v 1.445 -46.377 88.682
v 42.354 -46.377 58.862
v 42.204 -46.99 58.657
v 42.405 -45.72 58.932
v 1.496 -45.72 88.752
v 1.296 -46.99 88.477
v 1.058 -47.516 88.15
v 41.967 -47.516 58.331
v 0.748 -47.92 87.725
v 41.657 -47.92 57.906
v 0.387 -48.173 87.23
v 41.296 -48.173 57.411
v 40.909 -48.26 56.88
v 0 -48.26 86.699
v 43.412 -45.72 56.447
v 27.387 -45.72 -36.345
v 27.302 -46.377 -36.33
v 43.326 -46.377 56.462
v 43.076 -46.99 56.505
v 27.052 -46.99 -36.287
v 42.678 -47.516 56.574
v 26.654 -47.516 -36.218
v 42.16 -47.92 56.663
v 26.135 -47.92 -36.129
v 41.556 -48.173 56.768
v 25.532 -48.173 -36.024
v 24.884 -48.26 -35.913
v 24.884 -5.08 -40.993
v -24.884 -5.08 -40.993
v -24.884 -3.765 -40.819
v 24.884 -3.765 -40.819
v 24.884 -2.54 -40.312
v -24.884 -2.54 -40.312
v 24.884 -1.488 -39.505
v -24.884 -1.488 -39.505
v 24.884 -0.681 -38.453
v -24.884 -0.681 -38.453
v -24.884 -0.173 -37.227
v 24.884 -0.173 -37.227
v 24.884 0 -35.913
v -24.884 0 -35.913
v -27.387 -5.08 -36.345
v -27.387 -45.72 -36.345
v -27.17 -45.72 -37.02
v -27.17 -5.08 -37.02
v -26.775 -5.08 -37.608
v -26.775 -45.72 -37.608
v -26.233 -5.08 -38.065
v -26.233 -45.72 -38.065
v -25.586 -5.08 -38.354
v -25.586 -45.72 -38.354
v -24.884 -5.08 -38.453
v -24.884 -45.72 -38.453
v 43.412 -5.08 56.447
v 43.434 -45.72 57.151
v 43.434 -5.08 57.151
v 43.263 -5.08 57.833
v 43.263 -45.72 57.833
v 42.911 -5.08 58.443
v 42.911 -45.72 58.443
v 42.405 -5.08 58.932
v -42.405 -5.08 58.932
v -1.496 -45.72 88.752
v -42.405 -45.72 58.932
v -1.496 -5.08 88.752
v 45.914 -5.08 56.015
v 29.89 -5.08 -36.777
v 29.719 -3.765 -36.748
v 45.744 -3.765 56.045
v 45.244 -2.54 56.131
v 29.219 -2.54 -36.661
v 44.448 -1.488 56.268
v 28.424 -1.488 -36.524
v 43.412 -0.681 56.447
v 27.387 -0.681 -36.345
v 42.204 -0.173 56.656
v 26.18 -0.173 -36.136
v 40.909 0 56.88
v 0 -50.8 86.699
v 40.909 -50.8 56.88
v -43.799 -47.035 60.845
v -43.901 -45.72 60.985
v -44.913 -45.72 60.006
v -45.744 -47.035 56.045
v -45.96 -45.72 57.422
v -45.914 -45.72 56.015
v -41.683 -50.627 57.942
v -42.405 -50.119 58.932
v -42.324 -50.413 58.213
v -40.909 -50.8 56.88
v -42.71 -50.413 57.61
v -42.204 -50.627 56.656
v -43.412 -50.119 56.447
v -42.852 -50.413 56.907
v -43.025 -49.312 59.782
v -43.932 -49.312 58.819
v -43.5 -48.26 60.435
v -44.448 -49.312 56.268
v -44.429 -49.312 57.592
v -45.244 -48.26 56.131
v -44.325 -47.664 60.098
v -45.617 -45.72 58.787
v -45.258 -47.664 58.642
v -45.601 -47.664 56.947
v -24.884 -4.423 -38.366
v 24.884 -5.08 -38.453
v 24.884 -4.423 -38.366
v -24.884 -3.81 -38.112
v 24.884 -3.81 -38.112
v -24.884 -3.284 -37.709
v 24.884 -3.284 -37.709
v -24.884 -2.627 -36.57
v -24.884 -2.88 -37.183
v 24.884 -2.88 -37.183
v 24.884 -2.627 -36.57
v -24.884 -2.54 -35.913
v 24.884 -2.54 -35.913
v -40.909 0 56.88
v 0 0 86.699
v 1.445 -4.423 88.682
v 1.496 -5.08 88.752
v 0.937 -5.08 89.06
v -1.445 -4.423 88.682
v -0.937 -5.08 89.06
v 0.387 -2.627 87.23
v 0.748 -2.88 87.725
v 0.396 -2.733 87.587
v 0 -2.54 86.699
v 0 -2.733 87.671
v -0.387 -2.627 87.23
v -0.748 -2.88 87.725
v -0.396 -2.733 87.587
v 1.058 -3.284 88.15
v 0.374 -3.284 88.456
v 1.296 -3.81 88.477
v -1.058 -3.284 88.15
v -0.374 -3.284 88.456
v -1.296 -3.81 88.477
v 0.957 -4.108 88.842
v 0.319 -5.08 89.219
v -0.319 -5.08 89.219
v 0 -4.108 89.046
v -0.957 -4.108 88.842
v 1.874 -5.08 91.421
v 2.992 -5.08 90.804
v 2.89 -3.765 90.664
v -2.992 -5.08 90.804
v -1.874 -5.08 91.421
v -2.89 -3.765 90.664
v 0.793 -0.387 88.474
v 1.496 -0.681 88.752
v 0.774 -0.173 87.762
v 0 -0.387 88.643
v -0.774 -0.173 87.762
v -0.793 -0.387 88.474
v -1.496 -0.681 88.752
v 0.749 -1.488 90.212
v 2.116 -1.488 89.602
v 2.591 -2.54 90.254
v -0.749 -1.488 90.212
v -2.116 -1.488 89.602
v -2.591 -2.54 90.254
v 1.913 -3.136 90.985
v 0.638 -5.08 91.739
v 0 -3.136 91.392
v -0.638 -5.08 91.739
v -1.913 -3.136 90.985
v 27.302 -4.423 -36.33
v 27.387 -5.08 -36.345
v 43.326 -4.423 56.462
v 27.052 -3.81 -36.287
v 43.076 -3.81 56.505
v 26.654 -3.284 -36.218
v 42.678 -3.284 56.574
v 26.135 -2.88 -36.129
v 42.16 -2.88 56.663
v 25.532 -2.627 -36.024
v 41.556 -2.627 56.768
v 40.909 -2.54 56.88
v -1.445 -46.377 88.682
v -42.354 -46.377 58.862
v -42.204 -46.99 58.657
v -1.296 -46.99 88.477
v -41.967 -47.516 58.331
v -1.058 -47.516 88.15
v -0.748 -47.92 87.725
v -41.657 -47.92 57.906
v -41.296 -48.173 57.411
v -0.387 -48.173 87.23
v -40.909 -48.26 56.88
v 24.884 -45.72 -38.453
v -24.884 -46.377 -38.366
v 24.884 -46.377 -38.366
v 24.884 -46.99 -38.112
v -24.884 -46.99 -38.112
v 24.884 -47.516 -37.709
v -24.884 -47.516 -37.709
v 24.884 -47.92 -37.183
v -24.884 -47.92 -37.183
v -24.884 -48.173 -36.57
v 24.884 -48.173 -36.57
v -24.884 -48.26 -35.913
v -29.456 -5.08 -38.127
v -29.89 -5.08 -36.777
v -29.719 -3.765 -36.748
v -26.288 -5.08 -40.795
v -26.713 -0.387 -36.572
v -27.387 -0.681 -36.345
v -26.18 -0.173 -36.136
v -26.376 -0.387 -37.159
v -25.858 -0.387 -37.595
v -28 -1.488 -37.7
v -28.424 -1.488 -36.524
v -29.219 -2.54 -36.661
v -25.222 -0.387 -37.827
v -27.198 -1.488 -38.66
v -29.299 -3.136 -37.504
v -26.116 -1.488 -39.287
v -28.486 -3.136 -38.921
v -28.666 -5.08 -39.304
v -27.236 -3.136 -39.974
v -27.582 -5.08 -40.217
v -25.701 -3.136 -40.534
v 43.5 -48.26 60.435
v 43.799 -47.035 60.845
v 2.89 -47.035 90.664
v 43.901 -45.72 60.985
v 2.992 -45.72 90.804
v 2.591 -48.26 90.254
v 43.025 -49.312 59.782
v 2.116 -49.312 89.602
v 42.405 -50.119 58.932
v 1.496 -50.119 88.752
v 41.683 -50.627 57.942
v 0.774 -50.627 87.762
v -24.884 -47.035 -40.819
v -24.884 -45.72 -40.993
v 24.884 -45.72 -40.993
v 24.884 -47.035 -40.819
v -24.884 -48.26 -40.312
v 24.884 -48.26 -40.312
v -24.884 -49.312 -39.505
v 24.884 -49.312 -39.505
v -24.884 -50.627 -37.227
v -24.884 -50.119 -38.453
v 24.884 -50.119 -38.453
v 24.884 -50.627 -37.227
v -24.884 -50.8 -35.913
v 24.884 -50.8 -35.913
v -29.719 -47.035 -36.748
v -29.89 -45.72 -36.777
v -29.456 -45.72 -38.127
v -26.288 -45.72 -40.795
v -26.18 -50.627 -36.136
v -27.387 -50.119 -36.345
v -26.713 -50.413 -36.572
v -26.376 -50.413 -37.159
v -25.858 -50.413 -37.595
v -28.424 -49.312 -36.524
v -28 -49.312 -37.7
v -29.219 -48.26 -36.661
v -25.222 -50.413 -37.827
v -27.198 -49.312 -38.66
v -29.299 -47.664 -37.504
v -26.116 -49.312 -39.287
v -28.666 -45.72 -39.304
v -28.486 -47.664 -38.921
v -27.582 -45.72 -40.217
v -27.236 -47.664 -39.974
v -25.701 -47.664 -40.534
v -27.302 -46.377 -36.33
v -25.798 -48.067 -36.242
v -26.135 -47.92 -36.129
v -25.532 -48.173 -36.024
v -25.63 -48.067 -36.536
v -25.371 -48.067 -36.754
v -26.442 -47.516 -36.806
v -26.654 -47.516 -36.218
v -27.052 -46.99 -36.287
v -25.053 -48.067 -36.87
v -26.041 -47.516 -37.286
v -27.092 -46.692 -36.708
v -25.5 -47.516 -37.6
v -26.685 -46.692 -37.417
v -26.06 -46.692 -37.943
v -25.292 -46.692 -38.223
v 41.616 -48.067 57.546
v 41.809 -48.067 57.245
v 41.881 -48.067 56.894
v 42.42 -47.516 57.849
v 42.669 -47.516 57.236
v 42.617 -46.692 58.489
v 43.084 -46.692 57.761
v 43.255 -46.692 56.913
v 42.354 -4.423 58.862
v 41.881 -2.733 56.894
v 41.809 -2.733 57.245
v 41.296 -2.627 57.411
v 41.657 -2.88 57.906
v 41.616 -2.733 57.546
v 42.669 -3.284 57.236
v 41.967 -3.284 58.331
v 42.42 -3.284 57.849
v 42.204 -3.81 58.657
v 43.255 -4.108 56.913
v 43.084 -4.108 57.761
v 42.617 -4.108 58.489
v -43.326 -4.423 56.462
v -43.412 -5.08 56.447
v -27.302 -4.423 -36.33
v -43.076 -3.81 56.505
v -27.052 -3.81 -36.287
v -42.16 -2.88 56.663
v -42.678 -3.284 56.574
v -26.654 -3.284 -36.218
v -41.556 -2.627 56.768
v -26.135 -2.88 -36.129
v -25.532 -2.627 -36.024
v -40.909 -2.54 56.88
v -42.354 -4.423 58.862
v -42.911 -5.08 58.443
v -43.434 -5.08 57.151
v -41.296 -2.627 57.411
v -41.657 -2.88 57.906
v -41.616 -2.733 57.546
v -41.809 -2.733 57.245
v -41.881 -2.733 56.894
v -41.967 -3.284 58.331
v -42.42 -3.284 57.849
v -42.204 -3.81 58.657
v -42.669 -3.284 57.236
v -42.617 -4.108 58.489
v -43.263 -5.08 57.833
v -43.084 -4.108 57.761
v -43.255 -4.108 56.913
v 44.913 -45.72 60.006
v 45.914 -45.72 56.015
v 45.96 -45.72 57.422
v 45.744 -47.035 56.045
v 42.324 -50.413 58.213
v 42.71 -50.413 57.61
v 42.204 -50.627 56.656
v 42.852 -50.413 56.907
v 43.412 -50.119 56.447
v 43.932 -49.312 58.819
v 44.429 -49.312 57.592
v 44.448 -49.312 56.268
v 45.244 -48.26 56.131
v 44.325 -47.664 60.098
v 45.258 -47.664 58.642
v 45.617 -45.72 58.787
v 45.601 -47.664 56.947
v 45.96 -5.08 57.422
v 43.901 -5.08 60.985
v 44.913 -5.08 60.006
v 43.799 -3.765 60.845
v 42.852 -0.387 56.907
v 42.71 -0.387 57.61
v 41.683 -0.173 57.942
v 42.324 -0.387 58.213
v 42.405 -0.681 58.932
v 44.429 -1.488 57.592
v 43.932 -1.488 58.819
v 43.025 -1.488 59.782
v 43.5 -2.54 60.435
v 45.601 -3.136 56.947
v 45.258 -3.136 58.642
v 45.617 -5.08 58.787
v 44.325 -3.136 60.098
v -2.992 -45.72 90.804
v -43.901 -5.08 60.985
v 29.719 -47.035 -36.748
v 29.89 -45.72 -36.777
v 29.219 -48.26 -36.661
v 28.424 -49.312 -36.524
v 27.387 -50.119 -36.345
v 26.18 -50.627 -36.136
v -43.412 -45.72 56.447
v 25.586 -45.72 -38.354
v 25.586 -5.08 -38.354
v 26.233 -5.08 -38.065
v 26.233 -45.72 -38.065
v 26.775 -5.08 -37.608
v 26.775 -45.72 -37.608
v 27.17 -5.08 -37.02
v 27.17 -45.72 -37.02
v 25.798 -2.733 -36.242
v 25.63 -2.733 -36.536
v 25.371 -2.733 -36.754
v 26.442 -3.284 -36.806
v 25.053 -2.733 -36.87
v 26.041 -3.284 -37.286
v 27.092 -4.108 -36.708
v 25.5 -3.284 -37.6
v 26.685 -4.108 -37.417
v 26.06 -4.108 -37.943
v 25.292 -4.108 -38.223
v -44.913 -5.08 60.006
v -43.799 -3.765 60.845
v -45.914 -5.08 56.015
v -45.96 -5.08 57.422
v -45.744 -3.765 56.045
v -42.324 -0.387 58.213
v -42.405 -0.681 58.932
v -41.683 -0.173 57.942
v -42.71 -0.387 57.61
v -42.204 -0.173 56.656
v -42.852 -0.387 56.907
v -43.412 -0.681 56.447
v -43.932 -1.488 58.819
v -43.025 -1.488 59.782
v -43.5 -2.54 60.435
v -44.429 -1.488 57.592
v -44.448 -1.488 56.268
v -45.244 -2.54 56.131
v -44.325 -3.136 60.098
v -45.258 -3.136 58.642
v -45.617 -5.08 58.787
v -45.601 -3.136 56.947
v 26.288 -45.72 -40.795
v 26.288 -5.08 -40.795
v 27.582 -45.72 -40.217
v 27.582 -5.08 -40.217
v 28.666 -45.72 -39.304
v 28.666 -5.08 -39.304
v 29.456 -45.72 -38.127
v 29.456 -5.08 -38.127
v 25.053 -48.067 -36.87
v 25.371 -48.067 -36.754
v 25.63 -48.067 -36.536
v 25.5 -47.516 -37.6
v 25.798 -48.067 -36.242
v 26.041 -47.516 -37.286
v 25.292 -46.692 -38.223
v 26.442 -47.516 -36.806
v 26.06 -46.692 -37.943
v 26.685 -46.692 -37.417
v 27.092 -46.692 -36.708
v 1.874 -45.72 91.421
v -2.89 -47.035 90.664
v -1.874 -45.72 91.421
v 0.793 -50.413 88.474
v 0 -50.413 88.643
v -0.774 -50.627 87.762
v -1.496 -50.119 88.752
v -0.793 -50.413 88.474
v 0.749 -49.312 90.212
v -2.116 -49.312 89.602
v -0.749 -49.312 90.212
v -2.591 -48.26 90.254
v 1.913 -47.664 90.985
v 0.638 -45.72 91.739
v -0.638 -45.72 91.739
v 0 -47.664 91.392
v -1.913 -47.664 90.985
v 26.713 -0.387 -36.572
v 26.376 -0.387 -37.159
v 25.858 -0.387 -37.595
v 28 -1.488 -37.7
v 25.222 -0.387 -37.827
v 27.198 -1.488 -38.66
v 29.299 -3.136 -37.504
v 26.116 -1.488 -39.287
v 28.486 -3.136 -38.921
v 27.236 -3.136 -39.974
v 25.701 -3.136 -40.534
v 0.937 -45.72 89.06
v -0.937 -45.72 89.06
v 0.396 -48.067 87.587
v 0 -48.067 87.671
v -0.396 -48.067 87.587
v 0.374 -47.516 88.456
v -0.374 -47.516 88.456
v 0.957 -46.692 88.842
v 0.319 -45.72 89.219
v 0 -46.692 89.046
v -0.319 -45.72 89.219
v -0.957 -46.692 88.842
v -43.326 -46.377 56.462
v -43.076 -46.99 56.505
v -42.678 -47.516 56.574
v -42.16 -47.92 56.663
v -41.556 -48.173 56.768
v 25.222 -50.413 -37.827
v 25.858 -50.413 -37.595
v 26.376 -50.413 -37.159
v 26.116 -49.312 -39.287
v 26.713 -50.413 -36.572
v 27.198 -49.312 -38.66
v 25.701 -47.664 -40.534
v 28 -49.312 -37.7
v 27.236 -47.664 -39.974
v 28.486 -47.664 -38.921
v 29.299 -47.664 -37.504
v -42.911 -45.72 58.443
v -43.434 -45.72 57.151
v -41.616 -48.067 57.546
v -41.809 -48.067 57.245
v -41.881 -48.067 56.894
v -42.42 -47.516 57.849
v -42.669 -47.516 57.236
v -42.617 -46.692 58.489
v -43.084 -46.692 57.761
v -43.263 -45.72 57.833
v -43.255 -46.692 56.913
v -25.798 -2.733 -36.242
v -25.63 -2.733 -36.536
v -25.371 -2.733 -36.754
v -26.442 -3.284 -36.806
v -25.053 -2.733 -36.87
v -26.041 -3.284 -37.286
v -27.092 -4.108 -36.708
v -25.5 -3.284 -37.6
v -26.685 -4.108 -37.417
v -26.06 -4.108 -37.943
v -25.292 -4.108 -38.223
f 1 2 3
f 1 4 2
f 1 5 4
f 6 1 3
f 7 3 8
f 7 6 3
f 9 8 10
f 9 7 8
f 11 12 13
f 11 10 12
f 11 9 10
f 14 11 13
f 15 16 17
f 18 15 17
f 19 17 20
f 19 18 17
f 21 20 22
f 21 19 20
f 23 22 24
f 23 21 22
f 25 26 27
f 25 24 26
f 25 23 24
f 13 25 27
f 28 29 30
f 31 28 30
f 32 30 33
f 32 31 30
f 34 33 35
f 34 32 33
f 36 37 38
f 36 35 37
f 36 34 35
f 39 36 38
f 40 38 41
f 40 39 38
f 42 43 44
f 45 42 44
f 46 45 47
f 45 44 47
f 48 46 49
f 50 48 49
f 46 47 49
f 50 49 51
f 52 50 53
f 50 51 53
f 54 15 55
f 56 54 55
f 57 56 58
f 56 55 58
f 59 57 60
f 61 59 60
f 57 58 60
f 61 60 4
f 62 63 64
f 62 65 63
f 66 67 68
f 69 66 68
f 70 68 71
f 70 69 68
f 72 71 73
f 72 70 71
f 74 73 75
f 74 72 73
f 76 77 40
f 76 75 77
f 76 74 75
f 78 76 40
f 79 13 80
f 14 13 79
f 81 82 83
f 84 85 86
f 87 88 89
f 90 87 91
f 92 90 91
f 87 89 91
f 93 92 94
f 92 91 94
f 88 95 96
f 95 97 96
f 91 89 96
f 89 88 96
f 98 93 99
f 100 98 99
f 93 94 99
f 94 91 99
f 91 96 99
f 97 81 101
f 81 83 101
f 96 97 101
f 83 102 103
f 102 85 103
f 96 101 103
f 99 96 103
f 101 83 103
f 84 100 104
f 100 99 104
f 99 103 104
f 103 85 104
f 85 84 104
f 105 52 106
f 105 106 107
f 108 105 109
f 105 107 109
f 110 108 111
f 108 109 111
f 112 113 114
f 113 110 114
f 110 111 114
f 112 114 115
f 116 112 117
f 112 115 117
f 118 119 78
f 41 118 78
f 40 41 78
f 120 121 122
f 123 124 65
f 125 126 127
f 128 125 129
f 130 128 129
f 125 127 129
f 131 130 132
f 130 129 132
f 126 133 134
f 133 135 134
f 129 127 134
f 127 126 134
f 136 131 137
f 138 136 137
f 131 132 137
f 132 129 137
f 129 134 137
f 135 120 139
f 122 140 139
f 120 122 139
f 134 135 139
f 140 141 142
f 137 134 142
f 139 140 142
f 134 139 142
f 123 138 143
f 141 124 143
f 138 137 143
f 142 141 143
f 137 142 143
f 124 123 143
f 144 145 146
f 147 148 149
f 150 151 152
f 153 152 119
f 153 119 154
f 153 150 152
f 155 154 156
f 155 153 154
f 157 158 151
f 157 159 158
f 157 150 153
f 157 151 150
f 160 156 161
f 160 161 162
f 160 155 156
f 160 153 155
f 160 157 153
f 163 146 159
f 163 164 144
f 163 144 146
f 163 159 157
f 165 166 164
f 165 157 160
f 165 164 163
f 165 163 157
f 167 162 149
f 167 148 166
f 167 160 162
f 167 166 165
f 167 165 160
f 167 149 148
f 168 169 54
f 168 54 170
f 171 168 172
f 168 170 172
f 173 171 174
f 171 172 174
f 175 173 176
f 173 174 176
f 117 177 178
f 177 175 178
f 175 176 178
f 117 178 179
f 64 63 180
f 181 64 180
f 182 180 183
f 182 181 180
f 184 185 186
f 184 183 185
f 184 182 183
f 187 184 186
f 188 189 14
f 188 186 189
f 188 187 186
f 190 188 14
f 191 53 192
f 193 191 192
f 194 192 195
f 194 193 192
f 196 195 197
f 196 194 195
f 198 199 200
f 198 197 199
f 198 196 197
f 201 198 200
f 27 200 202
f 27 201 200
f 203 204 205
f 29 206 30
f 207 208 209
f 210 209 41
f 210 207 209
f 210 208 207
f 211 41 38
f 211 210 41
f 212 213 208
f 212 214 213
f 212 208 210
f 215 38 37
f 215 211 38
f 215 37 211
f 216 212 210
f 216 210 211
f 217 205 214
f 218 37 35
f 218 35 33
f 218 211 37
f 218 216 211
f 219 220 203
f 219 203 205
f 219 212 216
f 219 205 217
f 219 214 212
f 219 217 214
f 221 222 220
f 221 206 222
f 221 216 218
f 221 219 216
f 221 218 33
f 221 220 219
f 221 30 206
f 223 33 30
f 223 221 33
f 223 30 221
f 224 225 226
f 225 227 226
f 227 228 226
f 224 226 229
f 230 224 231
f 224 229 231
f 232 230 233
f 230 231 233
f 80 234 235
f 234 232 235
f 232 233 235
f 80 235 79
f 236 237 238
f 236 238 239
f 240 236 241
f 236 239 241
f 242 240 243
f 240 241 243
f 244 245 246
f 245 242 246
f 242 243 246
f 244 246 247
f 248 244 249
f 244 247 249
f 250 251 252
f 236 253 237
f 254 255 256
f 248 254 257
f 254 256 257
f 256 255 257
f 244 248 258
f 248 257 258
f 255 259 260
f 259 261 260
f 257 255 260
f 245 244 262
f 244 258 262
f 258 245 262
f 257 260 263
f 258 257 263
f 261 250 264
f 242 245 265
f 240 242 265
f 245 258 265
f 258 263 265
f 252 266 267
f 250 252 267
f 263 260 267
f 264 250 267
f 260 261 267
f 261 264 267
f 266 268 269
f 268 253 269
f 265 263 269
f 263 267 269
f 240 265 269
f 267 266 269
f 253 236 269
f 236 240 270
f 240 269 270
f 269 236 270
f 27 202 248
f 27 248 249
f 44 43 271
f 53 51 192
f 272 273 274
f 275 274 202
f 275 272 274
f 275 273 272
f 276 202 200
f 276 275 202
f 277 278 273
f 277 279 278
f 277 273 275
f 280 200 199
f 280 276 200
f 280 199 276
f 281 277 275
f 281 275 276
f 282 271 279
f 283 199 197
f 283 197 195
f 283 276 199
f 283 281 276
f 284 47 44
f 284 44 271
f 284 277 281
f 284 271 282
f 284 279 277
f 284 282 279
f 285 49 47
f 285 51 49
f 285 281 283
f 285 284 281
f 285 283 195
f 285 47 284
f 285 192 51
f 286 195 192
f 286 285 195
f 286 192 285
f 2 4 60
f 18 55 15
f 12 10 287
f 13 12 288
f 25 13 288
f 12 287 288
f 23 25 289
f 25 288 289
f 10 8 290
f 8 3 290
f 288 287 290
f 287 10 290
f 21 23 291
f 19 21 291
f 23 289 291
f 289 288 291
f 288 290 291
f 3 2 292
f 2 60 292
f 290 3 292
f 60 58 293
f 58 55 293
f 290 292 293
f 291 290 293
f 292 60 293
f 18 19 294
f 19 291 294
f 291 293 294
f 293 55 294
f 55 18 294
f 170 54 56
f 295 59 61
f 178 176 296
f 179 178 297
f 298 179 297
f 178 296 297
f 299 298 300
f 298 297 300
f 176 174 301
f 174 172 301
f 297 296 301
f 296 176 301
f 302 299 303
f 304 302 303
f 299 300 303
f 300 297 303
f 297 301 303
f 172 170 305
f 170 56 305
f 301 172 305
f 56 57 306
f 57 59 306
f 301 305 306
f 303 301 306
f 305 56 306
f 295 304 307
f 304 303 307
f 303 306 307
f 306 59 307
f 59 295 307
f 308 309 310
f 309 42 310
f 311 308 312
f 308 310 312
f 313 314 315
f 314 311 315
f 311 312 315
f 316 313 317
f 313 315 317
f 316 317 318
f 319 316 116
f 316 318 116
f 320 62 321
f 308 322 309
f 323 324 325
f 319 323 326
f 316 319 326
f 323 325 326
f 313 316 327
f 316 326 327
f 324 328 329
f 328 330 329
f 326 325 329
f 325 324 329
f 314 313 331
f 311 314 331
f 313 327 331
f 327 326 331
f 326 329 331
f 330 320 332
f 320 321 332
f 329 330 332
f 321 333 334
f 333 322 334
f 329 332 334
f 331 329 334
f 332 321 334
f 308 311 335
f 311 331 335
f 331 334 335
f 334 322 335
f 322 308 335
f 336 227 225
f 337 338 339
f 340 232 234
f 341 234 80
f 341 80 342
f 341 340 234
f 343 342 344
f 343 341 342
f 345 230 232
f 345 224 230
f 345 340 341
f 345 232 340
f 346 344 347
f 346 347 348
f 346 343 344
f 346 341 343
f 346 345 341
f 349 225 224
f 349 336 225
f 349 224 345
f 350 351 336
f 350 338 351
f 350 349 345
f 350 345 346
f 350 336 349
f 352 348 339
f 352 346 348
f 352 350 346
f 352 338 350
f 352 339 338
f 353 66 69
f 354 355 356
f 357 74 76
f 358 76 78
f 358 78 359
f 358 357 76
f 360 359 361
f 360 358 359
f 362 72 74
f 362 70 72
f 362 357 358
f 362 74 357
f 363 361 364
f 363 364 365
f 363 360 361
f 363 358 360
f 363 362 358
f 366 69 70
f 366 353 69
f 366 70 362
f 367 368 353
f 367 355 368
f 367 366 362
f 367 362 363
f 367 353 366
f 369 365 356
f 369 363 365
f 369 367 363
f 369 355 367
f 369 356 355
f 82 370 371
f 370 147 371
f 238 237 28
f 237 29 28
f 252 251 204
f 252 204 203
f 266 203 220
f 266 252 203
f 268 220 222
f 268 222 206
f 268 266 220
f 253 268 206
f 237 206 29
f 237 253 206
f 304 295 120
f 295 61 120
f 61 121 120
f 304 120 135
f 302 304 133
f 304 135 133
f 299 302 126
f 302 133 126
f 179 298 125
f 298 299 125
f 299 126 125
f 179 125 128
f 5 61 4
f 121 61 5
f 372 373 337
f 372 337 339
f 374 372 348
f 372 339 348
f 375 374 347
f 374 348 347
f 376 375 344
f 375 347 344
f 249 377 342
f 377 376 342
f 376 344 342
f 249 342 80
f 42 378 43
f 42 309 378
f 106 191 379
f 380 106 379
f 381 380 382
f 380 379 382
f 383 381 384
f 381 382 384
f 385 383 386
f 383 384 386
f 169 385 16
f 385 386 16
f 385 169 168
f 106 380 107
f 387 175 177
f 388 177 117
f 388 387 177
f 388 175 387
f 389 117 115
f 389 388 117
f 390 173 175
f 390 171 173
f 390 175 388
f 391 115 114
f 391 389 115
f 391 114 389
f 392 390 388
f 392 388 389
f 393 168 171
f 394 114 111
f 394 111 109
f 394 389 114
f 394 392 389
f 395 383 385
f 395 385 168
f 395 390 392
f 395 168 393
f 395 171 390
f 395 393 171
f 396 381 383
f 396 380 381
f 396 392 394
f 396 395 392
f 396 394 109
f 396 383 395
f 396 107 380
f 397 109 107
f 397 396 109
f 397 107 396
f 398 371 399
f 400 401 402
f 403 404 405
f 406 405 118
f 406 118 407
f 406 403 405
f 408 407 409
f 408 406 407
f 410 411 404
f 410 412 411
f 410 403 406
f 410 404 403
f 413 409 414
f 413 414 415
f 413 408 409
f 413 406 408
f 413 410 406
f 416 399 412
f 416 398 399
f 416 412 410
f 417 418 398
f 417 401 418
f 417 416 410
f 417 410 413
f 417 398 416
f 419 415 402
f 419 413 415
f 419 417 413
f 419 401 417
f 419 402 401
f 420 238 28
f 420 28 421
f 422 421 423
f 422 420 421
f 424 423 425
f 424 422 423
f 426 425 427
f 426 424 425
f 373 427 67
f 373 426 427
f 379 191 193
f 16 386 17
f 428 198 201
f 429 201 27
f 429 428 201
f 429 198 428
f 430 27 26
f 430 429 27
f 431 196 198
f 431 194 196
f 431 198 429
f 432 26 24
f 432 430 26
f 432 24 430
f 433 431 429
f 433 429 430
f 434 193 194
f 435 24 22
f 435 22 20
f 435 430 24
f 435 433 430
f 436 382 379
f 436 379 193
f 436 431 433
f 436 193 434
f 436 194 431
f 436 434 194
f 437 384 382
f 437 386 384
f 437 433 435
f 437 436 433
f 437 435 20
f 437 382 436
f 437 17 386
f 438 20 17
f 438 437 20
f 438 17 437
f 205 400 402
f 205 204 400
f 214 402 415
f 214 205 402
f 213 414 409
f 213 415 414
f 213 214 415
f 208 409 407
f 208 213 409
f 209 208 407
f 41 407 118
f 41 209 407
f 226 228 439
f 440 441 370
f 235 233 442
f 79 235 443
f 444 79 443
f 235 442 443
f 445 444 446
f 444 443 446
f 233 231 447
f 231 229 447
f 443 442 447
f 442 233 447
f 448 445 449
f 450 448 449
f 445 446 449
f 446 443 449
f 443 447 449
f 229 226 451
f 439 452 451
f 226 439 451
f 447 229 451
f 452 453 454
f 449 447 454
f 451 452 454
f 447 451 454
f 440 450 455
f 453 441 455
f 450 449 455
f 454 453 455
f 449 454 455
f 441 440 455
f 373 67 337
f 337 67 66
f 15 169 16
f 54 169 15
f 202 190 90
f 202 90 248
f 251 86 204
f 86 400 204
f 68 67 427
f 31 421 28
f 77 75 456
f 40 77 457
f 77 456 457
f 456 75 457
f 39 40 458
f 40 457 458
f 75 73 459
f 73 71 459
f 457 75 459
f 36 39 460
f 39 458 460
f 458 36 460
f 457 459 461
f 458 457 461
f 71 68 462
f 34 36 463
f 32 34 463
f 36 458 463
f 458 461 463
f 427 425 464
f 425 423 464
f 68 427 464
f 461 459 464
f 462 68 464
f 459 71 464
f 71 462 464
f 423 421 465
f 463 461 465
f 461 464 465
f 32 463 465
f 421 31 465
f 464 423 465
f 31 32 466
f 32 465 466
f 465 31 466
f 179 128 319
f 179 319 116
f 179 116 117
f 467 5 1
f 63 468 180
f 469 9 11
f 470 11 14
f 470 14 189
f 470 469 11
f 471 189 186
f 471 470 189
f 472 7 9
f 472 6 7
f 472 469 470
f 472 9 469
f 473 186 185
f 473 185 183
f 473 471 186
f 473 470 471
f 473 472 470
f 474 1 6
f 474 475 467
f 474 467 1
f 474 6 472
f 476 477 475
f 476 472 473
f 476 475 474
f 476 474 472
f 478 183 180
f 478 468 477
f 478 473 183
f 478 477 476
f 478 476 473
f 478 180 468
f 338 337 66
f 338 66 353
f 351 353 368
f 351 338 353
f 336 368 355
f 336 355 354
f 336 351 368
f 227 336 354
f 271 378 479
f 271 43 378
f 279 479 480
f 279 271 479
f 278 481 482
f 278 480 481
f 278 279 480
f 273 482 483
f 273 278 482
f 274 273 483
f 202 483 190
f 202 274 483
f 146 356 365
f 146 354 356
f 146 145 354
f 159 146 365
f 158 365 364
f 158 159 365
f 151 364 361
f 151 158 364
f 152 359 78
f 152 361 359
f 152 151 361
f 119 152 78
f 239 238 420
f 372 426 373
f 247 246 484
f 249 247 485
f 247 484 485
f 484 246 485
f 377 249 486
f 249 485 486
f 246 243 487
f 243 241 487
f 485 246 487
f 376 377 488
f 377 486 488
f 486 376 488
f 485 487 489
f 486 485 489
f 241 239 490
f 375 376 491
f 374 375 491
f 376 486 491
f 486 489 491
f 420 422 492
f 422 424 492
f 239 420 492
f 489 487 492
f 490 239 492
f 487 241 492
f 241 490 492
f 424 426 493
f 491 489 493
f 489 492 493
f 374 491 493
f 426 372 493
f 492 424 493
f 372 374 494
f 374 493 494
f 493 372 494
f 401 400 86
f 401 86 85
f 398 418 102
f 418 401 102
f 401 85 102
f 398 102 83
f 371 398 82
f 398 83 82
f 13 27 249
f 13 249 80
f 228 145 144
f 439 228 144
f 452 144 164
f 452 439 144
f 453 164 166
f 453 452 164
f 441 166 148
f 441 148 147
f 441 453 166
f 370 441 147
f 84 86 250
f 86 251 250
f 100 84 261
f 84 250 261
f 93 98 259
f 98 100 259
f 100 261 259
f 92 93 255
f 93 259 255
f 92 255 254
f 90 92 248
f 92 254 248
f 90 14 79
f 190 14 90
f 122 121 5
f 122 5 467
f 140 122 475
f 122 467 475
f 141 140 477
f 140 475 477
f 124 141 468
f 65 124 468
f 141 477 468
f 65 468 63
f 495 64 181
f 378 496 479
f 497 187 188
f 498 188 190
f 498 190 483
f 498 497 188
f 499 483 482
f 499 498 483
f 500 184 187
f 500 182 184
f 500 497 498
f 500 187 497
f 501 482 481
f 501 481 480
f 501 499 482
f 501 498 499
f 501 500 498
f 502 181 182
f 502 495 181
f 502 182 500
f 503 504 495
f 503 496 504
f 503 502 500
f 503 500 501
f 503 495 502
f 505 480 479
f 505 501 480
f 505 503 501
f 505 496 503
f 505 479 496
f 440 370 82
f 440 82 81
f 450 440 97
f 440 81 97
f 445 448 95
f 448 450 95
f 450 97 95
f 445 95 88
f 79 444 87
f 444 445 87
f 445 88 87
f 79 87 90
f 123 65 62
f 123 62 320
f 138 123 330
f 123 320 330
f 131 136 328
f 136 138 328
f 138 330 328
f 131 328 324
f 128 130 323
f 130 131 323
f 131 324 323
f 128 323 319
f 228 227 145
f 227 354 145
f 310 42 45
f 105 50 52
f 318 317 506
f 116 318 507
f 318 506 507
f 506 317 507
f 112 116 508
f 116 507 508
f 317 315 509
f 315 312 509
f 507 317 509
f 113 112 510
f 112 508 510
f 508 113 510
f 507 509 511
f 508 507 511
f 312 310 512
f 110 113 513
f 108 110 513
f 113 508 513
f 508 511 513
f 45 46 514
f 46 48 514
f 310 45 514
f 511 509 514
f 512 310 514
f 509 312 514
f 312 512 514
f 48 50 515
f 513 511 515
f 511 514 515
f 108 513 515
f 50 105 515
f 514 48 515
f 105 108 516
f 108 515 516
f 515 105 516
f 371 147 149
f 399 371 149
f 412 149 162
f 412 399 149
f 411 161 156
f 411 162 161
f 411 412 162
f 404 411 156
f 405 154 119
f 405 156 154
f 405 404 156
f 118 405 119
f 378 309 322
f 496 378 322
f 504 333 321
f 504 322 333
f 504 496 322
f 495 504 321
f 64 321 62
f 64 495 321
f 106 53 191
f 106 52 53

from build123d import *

# Parameters (mm, degrees)
F1_DEPTH = 50.8
F2_R     = 5.08
F3_T     = -2.54


# Not quite as in the source:
# - a shell that OpenCascade refuses in one call is made with other operations: the cavity is built on its own and cut out


with BuildPart() as f1:
    # F0 (on Front) → F1 (new body)
    with BuildSketch(Plane.XZ):
        Polygon((-46.4516356587, 59.1254718602), (-29.1618652595, -40.9925776591), (-21.6381347405, -40.9925776591), (21.6381347405, -40.9925776591), (29.1618652595, -40.9925776591), (46.4516356587, 59.1254718602), (0, 92.9853990674), align=None)
    extrude(amount=F1_DEPTH)

    # F2
    f2_edges = [f1.edges().sort_by_distance(p)[0] for p in [
        (23.225818, -50.8, 76.055435),
        (-23.225818, -50.8, 76.055435),
        (-37.80675, -50.8, 9.066447),
        (0, -50.8, -40.992578),
        (37.80675, -50.8, 9.066447),
        (29.161865, -25.4, -40.992578),
        (46.451636, -25.4, 59.125472),
        (37.80675, 0, 9.066447),
        (23.225818, 0, 76.055435),
        (-23.225818, 0, 76.055435),
        (-37.80675, 0, 9.066447),
        (0, 0, -40.992578),
        (-46.451636, -25.4, 59.125472),
        (-29.161865, -25.4, -40.992578),
        (0, -25.4, 92.985399),
    ]]
    fillet(f2_edges, radius=F2_R)

    # F3: a shell. OpenCascade refuses it in one call, so the cavity is built on its own and cut out:
    # the body offset inwards by the wall thickness, plus a prism from it out through each open face.
    f3_core = offset(f1.part, amount=F3_T, mode=Mode.PRIVATE)
    f3_exits = [f3_core.faces().sort_by_distance(p)[0] for p in [
        (0, -48.26, 23.00503),
    ]]
    add(f3_core, mode=Mode.SUBTRACT)
    extrude(f3_exits, amount=-F3_T, mode=Mode.SUBTRACT)


solid = f1.part
